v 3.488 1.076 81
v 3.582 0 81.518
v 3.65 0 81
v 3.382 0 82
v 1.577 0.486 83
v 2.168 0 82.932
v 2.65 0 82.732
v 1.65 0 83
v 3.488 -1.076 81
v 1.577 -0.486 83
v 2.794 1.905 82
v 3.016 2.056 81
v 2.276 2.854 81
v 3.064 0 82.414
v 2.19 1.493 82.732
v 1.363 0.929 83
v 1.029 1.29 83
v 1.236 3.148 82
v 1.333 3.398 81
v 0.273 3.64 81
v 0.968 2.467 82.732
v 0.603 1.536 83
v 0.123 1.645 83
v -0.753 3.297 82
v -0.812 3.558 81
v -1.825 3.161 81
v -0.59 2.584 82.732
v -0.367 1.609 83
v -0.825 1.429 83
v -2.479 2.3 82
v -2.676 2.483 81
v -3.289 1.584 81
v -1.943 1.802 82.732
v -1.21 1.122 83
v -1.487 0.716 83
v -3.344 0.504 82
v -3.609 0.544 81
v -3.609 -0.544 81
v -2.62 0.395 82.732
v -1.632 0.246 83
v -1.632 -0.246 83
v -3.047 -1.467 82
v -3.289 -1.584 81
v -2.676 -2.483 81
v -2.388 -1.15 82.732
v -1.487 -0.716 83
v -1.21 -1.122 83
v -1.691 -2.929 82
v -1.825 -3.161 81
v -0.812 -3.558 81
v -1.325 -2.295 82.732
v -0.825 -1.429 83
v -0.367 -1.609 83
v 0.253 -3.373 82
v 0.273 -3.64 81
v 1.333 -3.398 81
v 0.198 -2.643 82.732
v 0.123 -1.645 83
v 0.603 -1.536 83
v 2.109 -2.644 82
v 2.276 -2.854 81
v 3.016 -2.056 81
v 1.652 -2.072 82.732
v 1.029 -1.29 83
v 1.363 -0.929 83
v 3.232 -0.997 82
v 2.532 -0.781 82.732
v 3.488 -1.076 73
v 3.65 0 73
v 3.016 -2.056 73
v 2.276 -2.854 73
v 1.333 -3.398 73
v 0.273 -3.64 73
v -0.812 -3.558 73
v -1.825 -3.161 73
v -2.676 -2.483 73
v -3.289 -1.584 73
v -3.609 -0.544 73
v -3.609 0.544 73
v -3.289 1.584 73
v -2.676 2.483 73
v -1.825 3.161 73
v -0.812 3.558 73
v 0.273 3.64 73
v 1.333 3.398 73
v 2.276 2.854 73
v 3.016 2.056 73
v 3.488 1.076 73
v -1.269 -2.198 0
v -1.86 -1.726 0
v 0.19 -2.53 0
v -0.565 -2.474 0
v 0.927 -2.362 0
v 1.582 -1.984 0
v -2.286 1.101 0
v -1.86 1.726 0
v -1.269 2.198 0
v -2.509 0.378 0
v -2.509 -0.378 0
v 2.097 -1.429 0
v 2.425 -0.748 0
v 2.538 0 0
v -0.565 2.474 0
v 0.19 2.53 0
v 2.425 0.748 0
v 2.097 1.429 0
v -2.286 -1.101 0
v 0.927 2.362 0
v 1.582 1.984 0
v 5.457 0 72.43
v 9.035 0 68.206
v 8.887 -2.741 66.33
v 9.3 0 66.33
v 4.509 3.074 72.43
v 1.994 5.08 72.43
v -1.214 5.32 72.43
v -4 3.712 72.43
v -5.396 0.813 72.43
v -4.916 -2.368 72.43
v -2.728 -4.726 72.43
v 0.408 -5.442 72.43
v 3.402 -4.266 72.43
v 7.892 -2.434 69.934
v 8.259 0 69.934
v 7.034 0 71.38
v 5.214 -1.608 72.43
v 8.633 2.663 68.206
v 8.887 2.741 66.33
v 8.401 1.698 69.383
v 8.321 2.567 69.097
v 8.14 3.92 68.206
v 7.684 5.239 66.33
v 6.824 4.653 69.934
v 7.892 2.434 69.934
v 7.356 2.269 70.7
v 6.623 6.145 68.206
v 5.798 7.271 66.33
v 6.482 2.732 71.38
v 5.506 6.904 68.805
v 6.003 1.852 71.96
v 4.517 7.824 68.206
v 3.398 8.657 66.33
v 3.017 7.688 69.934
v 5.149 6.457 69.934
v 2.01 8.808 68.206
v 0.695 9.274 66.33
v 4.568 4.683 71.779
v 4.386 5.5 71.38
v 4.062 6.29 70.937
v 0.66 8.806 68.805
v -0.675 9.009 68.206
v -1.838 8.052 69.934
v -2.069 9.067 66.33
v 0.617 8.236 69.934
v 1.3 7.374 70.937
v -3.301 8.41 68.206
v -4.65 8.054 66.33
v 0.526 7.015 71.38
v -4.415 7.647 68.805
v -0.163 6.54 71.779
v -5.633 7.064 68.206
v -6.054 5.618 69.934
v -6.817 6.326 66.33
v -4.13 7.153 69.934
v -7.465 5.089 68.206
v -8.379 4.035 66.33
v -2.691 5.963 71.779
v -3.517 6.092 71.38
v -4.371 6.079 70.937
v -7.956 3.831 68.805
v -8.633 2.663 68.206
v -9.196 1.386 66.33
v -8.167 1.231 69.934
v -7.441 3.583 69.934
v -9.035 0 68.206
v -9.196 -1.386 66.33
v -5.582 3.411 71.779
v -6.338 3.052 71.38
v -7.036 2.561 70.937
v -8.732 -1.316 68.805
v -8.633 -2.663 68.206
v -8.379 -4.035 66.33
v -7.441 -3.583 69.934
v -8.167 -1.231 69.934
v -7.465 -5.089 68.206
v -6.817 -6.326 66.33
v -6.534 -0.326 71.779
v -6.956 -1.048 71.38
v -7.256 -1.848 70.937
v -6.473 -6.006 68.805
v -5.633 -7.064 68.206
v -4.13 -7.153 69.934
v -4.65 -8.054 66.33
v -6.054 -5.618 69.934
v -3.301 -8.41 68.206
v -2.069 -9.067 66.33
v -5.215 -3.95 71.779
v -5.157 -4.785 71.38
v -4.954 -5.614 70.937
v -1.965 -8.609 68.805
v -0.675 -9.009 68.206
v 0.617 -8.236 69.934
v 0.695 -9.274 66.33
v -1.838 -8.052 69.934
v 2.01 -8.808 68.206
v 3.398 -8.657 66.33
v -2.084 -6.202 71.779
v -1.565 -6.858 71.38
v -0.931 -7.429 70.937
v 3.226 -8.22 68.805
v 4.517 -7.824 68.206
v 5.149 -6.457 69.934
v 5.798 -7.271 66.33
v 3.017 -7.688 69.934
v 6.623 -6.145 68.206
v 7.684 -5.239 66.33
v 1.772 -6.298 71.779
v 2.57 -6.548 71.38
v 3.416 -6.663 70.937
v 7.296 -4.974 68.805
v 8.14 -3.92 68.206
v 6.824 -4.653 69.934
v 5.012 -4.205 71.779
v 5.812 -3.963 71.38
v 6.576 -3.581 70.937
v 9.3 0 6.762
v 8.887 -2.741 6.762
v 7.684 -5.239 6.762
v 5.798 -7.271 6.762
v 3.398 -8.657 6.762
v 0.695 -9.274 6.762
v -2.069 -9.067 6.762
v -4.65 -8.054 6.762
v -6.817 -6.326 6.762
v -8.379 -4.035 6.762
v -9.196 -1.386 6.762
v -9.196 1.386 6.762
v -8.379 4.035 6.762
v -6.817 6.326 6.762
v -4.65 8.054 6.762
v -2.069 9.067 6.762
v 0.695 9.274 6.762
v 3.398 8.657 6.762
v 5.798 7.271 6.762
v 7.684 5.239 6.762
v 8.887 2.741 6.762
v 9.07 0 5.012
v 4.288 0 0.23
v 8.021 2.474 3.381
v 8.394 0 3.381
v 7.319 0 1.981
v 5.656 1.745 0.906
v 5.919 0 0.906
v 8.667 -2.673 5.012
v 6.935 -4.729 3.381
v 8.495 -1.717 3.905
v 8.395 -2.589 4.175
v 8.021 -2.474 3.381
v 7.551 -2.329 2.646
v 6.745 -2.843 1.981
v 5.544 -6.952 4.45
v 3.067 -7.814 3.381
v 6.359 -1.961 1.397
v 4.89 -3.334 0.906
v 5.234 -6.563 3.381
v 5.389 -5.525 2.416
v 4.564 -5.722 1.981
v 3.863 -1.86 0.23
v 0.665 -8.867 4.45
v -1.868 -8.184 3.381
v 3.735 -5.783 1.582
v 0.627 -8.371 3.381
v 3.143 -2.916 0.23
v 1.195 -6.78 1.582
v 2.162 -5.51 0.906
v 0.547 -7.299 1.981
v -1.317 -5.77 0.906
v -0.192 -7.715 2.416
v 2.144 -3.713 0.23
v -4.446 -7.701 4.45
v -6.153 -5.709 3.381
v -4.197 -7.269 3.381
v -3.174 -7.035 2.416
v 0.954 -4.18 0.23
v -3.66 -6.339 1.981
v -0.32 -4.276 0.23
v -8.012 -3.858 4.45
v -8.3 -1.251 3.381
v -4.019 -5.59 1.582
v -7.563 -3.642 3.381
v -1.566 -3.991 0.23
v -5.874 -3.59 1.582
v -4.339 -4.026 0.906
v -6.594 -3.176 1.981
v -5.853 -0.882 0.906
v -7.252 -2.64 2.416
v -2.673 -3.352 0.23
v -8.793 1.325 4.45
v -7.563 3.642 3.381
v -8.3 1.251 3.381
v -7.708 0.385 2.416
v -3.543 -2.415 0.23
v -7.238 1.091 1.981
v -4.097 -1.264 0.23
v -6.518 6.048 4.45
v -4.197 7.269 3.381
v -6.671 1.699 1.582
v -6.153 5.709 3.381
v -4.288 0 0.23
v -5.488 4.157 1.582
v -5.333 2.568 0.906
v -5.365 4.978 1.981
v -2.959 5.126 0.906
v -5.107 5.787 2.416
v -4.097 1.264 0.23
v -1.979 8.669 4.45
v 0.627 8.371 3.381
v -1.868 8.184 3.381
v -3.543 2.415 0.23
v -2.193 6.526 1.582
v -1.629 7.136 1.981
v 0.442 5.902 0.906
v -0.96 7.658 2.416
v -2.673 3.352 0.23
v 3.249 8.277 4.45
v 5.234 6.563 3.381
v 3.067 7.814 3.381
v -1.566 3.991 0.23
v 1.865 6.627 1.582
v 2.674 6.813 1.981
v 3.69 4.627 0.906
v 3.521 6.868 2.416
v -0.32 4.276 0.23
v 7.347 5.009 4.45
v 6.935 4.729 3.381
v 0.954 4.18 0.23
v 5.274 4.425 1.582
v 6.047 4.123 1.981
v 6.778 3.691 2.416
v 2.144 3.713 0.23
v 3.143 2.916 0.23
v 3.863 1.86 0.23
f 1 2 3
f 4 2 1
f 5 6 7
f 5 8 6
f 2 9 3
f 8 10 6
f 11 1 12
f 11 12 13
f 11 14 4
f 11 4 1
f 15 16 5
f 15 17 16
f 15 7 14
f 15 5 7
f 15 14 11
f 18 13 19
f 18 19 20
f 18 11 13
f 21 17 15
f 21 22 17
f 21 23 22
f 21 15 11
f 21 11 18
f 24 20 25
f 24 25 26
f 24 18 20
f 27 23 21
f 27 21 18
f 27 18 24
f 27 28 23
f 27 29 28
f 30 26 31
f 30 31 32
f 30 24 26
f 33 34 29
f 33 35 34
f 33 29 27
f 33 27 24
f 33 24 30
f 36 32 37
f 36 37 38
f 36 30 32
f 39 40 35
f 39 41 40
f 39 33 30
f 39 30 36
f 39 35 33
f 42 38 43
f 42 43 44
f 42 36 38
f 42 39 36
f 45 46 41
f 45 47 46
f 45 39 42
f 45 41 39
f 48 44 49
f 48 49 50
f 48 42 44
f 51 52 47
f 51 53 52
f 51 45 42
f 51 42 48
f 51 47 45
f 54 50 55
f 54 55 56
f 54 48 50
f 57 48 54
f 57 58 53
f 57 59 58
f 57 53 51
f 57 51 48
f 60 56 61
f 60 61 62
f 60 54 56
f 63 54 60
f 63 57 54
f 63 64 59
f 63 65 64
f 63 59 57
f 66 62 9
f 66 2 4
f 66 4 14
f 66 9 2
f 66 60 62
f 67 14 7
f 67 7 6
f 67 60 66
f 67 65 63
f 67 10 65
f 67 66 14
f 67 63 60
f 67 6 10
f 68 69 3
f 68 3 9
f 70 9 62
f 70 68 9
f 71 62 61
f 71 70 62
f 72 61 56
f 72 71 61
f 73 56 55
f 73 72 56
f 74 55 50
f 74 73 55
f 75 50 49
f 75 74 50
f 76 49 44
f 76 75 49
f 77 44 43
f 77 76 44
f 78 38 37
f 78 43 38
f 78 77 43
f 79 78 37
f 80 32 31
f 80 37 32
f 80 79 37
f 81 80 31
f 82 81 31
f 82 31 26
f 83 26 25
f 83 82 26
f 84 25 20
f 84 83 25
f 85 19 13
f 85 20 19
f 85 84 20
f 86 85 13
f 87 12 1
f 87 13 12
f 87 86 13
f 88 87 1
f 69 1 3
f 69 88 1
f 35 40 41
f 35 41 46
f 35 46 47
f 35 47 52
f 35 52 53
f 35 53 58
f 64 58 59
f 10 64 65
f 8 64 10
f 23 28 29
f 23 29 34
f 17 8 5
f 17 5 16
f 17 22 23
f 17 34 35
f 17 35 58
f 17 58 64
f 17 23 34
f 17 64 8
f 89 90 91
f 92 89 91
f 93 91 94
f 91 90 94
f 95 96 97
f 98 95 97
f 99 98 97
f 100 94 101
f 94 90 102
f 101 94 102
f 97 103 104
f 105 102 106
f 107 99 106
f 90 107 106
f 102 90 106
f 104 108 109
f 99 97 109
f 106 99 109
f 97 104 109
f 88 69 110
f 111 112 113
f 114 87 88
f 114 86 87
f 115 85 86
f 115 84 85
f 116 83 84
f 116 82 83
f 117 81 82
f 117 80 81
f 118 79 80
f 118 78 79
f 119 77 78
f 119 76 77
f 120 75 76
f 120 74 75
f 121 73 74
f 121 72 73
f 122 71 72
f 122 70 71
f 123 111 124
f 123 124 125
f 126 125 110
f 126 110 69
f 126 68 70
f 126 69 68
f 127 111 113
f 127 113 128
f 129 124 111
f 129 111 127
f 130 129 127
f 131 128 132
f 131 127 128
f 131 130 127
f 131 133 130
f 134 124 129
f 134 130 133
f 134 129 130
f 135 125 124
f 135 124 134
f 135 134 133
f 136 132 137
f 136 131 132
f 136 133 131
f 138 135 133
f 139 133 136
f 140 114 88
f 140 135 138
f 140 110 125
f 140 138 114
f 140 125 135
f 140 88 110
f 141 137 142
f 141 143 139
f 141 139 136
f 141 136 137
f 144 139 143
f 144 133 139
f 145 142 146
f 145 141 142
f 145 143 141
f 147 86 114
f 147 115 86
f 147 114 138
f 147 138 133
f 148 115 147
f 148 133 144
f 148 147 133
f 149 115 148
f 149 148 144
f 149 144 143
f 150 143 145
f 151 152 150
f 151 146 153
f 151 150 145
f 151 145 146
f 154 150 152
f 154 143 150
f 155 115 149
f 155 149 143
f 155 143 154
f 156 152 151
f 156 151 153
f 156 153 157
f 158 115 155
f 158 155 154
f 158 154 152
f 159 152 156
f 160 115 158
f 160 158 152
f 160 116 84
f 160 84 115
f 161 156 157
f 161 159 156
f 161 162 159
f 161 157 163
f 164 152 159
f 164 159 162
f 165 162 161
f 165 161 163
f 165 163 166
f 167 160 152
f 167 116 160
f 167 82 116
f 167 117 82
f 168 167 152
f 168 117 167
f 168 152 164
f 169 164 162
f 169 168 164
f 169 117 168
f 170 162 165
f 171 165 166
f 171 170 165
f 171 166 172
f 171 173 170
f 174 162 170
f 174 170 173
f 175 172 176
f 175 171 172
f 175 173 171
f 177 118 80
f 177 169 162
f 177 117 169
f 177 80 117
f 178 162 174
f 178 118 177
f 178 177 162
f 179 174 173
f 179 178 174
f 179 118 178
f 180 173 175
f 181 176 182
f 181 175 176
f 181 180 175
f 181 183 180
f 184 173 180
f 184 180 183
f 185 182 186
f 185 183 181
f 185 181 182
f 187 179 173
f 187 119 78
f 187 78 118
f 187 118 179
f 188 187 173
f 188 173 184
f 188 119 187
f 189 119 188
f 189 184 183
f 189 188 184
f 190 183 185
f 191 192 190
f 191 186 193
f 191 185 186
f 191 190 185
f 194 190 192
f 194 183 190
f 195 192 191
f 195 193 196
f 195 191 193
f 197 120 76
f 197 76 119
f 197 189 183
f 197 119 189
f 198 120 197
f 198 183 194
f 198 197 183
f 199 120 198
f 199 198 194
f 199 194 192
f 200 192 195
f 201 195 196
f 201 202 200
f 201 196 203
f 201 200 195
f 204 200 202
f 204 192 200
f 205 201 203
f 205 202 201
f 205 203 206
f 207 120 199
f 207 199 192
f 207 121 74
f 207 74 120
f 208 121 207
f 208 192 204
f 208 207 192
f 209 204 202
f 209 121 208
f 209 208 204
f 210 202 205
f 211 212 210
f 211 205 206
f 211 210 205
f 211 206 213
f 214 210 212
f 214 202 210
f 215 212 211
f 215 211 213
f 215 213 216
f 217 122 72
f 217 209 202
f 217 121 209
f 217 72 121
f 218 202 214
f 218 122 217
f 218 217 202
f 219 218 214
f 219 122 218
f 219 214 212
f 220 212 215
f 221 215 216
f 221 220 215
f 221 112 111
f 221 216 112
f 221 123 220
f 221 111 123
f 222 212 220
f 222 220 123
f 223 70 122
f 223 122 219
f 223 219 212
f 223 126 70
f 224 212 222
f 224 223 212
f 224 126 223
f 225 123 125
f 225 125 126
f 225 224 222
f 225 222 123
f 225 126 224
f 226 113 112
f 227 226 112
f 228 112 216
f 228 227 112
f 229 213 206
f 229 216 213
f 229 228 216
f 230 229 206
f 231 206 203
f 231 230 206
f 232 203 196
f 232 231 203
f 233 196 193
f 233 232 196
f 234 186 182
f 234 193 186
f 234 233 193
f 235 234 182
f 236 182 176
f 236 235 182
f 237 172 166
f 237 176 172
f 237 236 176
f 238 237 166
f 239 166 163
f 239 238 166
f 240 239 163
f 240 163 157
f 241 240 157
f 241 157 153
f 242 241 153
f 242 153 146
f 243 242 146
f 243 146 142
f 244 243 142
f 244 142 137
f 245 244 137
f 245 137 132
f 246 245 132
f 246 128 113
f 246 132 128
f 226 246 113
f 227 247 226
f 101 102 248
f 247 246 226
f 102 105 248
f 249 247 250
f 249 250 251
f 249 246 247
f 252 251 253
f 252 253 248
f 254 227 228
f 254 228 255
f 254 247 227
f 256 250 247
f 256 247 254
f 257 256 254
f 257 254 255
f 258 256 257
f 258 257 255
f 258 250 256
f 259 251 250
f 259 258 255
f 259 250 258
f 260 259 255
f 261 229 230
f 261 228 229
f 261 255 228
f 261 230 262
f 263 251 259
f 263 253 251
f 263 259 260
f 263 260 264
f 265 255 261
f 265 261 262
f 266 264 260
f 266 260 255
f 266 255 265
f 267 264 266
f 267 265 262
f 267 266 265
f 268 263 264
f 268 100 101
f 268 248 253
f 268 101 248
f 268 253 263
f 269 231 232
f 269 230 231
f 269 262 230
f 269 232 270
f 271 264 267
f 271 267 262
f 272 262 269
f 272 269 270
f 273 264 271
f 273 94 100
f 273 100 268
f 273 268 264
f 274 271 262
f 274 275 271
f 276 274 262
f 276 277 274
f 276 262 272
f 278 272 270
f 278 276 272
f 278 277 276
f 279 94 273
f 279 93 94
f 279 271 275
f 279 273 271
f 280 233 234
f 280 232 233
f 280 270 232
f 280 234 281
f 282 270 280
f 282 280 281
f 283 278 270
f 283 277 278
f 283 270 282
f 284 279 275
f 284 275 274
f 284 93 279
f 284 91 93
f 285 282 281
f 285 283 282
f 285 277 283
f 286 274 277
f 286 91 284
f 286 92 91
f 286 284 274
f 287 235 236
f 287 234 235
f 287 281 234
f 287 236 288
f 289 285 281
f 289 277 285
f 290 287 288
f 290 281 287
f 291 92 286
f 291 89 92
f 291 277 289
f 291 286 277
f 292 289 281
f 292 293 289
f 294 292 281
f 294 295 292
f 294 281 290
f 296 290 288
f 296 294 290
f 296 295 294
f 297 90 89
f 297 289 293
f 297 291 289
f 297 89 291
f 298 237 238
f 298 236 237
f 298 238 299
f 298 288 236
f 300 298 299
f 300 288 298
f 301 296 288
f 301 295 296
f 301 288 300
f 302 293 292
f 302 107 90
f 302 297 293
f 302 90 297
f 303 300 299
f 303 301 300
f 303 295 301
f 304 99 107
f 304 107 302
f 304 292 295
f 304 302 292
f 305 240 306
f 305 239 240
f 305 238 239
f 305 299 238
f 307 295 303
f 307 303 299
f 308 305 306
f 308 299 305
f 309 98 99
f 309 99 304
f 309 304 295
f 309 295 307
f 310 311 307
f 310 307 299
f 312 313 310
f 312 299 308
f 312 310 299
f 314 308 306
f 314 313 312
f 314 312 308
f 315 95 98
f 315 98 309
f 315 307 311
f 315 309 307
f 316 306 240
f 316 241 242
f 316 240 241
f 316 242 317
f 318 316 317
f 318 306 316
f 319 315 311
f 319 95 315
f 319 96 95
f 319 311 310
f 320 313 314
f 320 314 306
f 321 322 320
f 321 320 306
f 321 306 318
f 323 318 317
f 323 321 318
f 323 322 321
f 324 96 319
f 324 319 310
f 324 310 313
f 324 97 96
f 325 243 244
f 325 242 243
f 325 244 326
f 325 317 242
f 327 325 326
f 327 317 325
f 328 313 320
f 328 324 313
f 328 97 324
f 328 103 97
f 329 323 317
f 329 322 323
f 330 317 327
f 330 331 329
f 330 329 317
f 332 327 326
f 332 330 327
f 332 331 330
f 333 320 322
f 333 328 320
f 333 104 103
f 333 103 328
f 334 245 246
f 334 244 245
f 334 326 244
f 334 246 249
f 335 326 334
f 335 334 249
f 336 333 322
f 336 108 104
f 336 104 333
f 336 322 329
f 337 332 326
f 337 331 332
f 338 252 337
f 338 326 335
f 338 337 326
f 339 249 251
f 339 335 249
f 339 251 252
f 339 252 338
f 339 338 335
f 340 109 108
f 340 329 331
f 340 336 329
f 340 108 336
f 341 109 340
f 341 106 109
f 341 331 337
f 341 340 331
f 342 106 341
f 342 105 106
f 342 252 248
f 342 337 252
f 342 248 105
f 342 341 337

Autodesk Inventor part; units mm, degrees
ref_plane "YZ Plane" through (0, 0, 0) normal (1, 0, 0) x (0, 1, 0)
ref_plane "XZ Plane" through (0, 0, 0) normal (0, 1, 0) x (-1, 0, 0)
ref_plane "XY Plane" through (0, 0, 0) normal (0, 0, 1) x (1, 0, 0)
sketch "Sketch1" plane through (0, 0, 0) normal (0, 0, 1) x (1, 0, 0)
  circle A0 centre (0, 0) radius 9.3
  dimension "d0" = 18.6
extrude "Extrusion1" add sketch "Sketch1" along normal blind 73
sketch "Sketch2" plane through (0, 0, 73) normal (0, 0, 1) x (1, 0, 0)
  circle A0 centre (0, 0) radius 3.65
  dimension "d3" = 7.3
extrude "Extrusion2" add sketch "Sketch2" along normal blind 10
fillet "Fillet1" radius 6.7625 1 edges at (-9.3, 0, 73)
fillet "Fillet2" radius 2 1 edges at (-3.65, 0, 83)
fillet "Fillet3" radius 6.7625 1 edges at (-9.3, 0, 0)
properties part number "12g_CO2_Cartridge"
